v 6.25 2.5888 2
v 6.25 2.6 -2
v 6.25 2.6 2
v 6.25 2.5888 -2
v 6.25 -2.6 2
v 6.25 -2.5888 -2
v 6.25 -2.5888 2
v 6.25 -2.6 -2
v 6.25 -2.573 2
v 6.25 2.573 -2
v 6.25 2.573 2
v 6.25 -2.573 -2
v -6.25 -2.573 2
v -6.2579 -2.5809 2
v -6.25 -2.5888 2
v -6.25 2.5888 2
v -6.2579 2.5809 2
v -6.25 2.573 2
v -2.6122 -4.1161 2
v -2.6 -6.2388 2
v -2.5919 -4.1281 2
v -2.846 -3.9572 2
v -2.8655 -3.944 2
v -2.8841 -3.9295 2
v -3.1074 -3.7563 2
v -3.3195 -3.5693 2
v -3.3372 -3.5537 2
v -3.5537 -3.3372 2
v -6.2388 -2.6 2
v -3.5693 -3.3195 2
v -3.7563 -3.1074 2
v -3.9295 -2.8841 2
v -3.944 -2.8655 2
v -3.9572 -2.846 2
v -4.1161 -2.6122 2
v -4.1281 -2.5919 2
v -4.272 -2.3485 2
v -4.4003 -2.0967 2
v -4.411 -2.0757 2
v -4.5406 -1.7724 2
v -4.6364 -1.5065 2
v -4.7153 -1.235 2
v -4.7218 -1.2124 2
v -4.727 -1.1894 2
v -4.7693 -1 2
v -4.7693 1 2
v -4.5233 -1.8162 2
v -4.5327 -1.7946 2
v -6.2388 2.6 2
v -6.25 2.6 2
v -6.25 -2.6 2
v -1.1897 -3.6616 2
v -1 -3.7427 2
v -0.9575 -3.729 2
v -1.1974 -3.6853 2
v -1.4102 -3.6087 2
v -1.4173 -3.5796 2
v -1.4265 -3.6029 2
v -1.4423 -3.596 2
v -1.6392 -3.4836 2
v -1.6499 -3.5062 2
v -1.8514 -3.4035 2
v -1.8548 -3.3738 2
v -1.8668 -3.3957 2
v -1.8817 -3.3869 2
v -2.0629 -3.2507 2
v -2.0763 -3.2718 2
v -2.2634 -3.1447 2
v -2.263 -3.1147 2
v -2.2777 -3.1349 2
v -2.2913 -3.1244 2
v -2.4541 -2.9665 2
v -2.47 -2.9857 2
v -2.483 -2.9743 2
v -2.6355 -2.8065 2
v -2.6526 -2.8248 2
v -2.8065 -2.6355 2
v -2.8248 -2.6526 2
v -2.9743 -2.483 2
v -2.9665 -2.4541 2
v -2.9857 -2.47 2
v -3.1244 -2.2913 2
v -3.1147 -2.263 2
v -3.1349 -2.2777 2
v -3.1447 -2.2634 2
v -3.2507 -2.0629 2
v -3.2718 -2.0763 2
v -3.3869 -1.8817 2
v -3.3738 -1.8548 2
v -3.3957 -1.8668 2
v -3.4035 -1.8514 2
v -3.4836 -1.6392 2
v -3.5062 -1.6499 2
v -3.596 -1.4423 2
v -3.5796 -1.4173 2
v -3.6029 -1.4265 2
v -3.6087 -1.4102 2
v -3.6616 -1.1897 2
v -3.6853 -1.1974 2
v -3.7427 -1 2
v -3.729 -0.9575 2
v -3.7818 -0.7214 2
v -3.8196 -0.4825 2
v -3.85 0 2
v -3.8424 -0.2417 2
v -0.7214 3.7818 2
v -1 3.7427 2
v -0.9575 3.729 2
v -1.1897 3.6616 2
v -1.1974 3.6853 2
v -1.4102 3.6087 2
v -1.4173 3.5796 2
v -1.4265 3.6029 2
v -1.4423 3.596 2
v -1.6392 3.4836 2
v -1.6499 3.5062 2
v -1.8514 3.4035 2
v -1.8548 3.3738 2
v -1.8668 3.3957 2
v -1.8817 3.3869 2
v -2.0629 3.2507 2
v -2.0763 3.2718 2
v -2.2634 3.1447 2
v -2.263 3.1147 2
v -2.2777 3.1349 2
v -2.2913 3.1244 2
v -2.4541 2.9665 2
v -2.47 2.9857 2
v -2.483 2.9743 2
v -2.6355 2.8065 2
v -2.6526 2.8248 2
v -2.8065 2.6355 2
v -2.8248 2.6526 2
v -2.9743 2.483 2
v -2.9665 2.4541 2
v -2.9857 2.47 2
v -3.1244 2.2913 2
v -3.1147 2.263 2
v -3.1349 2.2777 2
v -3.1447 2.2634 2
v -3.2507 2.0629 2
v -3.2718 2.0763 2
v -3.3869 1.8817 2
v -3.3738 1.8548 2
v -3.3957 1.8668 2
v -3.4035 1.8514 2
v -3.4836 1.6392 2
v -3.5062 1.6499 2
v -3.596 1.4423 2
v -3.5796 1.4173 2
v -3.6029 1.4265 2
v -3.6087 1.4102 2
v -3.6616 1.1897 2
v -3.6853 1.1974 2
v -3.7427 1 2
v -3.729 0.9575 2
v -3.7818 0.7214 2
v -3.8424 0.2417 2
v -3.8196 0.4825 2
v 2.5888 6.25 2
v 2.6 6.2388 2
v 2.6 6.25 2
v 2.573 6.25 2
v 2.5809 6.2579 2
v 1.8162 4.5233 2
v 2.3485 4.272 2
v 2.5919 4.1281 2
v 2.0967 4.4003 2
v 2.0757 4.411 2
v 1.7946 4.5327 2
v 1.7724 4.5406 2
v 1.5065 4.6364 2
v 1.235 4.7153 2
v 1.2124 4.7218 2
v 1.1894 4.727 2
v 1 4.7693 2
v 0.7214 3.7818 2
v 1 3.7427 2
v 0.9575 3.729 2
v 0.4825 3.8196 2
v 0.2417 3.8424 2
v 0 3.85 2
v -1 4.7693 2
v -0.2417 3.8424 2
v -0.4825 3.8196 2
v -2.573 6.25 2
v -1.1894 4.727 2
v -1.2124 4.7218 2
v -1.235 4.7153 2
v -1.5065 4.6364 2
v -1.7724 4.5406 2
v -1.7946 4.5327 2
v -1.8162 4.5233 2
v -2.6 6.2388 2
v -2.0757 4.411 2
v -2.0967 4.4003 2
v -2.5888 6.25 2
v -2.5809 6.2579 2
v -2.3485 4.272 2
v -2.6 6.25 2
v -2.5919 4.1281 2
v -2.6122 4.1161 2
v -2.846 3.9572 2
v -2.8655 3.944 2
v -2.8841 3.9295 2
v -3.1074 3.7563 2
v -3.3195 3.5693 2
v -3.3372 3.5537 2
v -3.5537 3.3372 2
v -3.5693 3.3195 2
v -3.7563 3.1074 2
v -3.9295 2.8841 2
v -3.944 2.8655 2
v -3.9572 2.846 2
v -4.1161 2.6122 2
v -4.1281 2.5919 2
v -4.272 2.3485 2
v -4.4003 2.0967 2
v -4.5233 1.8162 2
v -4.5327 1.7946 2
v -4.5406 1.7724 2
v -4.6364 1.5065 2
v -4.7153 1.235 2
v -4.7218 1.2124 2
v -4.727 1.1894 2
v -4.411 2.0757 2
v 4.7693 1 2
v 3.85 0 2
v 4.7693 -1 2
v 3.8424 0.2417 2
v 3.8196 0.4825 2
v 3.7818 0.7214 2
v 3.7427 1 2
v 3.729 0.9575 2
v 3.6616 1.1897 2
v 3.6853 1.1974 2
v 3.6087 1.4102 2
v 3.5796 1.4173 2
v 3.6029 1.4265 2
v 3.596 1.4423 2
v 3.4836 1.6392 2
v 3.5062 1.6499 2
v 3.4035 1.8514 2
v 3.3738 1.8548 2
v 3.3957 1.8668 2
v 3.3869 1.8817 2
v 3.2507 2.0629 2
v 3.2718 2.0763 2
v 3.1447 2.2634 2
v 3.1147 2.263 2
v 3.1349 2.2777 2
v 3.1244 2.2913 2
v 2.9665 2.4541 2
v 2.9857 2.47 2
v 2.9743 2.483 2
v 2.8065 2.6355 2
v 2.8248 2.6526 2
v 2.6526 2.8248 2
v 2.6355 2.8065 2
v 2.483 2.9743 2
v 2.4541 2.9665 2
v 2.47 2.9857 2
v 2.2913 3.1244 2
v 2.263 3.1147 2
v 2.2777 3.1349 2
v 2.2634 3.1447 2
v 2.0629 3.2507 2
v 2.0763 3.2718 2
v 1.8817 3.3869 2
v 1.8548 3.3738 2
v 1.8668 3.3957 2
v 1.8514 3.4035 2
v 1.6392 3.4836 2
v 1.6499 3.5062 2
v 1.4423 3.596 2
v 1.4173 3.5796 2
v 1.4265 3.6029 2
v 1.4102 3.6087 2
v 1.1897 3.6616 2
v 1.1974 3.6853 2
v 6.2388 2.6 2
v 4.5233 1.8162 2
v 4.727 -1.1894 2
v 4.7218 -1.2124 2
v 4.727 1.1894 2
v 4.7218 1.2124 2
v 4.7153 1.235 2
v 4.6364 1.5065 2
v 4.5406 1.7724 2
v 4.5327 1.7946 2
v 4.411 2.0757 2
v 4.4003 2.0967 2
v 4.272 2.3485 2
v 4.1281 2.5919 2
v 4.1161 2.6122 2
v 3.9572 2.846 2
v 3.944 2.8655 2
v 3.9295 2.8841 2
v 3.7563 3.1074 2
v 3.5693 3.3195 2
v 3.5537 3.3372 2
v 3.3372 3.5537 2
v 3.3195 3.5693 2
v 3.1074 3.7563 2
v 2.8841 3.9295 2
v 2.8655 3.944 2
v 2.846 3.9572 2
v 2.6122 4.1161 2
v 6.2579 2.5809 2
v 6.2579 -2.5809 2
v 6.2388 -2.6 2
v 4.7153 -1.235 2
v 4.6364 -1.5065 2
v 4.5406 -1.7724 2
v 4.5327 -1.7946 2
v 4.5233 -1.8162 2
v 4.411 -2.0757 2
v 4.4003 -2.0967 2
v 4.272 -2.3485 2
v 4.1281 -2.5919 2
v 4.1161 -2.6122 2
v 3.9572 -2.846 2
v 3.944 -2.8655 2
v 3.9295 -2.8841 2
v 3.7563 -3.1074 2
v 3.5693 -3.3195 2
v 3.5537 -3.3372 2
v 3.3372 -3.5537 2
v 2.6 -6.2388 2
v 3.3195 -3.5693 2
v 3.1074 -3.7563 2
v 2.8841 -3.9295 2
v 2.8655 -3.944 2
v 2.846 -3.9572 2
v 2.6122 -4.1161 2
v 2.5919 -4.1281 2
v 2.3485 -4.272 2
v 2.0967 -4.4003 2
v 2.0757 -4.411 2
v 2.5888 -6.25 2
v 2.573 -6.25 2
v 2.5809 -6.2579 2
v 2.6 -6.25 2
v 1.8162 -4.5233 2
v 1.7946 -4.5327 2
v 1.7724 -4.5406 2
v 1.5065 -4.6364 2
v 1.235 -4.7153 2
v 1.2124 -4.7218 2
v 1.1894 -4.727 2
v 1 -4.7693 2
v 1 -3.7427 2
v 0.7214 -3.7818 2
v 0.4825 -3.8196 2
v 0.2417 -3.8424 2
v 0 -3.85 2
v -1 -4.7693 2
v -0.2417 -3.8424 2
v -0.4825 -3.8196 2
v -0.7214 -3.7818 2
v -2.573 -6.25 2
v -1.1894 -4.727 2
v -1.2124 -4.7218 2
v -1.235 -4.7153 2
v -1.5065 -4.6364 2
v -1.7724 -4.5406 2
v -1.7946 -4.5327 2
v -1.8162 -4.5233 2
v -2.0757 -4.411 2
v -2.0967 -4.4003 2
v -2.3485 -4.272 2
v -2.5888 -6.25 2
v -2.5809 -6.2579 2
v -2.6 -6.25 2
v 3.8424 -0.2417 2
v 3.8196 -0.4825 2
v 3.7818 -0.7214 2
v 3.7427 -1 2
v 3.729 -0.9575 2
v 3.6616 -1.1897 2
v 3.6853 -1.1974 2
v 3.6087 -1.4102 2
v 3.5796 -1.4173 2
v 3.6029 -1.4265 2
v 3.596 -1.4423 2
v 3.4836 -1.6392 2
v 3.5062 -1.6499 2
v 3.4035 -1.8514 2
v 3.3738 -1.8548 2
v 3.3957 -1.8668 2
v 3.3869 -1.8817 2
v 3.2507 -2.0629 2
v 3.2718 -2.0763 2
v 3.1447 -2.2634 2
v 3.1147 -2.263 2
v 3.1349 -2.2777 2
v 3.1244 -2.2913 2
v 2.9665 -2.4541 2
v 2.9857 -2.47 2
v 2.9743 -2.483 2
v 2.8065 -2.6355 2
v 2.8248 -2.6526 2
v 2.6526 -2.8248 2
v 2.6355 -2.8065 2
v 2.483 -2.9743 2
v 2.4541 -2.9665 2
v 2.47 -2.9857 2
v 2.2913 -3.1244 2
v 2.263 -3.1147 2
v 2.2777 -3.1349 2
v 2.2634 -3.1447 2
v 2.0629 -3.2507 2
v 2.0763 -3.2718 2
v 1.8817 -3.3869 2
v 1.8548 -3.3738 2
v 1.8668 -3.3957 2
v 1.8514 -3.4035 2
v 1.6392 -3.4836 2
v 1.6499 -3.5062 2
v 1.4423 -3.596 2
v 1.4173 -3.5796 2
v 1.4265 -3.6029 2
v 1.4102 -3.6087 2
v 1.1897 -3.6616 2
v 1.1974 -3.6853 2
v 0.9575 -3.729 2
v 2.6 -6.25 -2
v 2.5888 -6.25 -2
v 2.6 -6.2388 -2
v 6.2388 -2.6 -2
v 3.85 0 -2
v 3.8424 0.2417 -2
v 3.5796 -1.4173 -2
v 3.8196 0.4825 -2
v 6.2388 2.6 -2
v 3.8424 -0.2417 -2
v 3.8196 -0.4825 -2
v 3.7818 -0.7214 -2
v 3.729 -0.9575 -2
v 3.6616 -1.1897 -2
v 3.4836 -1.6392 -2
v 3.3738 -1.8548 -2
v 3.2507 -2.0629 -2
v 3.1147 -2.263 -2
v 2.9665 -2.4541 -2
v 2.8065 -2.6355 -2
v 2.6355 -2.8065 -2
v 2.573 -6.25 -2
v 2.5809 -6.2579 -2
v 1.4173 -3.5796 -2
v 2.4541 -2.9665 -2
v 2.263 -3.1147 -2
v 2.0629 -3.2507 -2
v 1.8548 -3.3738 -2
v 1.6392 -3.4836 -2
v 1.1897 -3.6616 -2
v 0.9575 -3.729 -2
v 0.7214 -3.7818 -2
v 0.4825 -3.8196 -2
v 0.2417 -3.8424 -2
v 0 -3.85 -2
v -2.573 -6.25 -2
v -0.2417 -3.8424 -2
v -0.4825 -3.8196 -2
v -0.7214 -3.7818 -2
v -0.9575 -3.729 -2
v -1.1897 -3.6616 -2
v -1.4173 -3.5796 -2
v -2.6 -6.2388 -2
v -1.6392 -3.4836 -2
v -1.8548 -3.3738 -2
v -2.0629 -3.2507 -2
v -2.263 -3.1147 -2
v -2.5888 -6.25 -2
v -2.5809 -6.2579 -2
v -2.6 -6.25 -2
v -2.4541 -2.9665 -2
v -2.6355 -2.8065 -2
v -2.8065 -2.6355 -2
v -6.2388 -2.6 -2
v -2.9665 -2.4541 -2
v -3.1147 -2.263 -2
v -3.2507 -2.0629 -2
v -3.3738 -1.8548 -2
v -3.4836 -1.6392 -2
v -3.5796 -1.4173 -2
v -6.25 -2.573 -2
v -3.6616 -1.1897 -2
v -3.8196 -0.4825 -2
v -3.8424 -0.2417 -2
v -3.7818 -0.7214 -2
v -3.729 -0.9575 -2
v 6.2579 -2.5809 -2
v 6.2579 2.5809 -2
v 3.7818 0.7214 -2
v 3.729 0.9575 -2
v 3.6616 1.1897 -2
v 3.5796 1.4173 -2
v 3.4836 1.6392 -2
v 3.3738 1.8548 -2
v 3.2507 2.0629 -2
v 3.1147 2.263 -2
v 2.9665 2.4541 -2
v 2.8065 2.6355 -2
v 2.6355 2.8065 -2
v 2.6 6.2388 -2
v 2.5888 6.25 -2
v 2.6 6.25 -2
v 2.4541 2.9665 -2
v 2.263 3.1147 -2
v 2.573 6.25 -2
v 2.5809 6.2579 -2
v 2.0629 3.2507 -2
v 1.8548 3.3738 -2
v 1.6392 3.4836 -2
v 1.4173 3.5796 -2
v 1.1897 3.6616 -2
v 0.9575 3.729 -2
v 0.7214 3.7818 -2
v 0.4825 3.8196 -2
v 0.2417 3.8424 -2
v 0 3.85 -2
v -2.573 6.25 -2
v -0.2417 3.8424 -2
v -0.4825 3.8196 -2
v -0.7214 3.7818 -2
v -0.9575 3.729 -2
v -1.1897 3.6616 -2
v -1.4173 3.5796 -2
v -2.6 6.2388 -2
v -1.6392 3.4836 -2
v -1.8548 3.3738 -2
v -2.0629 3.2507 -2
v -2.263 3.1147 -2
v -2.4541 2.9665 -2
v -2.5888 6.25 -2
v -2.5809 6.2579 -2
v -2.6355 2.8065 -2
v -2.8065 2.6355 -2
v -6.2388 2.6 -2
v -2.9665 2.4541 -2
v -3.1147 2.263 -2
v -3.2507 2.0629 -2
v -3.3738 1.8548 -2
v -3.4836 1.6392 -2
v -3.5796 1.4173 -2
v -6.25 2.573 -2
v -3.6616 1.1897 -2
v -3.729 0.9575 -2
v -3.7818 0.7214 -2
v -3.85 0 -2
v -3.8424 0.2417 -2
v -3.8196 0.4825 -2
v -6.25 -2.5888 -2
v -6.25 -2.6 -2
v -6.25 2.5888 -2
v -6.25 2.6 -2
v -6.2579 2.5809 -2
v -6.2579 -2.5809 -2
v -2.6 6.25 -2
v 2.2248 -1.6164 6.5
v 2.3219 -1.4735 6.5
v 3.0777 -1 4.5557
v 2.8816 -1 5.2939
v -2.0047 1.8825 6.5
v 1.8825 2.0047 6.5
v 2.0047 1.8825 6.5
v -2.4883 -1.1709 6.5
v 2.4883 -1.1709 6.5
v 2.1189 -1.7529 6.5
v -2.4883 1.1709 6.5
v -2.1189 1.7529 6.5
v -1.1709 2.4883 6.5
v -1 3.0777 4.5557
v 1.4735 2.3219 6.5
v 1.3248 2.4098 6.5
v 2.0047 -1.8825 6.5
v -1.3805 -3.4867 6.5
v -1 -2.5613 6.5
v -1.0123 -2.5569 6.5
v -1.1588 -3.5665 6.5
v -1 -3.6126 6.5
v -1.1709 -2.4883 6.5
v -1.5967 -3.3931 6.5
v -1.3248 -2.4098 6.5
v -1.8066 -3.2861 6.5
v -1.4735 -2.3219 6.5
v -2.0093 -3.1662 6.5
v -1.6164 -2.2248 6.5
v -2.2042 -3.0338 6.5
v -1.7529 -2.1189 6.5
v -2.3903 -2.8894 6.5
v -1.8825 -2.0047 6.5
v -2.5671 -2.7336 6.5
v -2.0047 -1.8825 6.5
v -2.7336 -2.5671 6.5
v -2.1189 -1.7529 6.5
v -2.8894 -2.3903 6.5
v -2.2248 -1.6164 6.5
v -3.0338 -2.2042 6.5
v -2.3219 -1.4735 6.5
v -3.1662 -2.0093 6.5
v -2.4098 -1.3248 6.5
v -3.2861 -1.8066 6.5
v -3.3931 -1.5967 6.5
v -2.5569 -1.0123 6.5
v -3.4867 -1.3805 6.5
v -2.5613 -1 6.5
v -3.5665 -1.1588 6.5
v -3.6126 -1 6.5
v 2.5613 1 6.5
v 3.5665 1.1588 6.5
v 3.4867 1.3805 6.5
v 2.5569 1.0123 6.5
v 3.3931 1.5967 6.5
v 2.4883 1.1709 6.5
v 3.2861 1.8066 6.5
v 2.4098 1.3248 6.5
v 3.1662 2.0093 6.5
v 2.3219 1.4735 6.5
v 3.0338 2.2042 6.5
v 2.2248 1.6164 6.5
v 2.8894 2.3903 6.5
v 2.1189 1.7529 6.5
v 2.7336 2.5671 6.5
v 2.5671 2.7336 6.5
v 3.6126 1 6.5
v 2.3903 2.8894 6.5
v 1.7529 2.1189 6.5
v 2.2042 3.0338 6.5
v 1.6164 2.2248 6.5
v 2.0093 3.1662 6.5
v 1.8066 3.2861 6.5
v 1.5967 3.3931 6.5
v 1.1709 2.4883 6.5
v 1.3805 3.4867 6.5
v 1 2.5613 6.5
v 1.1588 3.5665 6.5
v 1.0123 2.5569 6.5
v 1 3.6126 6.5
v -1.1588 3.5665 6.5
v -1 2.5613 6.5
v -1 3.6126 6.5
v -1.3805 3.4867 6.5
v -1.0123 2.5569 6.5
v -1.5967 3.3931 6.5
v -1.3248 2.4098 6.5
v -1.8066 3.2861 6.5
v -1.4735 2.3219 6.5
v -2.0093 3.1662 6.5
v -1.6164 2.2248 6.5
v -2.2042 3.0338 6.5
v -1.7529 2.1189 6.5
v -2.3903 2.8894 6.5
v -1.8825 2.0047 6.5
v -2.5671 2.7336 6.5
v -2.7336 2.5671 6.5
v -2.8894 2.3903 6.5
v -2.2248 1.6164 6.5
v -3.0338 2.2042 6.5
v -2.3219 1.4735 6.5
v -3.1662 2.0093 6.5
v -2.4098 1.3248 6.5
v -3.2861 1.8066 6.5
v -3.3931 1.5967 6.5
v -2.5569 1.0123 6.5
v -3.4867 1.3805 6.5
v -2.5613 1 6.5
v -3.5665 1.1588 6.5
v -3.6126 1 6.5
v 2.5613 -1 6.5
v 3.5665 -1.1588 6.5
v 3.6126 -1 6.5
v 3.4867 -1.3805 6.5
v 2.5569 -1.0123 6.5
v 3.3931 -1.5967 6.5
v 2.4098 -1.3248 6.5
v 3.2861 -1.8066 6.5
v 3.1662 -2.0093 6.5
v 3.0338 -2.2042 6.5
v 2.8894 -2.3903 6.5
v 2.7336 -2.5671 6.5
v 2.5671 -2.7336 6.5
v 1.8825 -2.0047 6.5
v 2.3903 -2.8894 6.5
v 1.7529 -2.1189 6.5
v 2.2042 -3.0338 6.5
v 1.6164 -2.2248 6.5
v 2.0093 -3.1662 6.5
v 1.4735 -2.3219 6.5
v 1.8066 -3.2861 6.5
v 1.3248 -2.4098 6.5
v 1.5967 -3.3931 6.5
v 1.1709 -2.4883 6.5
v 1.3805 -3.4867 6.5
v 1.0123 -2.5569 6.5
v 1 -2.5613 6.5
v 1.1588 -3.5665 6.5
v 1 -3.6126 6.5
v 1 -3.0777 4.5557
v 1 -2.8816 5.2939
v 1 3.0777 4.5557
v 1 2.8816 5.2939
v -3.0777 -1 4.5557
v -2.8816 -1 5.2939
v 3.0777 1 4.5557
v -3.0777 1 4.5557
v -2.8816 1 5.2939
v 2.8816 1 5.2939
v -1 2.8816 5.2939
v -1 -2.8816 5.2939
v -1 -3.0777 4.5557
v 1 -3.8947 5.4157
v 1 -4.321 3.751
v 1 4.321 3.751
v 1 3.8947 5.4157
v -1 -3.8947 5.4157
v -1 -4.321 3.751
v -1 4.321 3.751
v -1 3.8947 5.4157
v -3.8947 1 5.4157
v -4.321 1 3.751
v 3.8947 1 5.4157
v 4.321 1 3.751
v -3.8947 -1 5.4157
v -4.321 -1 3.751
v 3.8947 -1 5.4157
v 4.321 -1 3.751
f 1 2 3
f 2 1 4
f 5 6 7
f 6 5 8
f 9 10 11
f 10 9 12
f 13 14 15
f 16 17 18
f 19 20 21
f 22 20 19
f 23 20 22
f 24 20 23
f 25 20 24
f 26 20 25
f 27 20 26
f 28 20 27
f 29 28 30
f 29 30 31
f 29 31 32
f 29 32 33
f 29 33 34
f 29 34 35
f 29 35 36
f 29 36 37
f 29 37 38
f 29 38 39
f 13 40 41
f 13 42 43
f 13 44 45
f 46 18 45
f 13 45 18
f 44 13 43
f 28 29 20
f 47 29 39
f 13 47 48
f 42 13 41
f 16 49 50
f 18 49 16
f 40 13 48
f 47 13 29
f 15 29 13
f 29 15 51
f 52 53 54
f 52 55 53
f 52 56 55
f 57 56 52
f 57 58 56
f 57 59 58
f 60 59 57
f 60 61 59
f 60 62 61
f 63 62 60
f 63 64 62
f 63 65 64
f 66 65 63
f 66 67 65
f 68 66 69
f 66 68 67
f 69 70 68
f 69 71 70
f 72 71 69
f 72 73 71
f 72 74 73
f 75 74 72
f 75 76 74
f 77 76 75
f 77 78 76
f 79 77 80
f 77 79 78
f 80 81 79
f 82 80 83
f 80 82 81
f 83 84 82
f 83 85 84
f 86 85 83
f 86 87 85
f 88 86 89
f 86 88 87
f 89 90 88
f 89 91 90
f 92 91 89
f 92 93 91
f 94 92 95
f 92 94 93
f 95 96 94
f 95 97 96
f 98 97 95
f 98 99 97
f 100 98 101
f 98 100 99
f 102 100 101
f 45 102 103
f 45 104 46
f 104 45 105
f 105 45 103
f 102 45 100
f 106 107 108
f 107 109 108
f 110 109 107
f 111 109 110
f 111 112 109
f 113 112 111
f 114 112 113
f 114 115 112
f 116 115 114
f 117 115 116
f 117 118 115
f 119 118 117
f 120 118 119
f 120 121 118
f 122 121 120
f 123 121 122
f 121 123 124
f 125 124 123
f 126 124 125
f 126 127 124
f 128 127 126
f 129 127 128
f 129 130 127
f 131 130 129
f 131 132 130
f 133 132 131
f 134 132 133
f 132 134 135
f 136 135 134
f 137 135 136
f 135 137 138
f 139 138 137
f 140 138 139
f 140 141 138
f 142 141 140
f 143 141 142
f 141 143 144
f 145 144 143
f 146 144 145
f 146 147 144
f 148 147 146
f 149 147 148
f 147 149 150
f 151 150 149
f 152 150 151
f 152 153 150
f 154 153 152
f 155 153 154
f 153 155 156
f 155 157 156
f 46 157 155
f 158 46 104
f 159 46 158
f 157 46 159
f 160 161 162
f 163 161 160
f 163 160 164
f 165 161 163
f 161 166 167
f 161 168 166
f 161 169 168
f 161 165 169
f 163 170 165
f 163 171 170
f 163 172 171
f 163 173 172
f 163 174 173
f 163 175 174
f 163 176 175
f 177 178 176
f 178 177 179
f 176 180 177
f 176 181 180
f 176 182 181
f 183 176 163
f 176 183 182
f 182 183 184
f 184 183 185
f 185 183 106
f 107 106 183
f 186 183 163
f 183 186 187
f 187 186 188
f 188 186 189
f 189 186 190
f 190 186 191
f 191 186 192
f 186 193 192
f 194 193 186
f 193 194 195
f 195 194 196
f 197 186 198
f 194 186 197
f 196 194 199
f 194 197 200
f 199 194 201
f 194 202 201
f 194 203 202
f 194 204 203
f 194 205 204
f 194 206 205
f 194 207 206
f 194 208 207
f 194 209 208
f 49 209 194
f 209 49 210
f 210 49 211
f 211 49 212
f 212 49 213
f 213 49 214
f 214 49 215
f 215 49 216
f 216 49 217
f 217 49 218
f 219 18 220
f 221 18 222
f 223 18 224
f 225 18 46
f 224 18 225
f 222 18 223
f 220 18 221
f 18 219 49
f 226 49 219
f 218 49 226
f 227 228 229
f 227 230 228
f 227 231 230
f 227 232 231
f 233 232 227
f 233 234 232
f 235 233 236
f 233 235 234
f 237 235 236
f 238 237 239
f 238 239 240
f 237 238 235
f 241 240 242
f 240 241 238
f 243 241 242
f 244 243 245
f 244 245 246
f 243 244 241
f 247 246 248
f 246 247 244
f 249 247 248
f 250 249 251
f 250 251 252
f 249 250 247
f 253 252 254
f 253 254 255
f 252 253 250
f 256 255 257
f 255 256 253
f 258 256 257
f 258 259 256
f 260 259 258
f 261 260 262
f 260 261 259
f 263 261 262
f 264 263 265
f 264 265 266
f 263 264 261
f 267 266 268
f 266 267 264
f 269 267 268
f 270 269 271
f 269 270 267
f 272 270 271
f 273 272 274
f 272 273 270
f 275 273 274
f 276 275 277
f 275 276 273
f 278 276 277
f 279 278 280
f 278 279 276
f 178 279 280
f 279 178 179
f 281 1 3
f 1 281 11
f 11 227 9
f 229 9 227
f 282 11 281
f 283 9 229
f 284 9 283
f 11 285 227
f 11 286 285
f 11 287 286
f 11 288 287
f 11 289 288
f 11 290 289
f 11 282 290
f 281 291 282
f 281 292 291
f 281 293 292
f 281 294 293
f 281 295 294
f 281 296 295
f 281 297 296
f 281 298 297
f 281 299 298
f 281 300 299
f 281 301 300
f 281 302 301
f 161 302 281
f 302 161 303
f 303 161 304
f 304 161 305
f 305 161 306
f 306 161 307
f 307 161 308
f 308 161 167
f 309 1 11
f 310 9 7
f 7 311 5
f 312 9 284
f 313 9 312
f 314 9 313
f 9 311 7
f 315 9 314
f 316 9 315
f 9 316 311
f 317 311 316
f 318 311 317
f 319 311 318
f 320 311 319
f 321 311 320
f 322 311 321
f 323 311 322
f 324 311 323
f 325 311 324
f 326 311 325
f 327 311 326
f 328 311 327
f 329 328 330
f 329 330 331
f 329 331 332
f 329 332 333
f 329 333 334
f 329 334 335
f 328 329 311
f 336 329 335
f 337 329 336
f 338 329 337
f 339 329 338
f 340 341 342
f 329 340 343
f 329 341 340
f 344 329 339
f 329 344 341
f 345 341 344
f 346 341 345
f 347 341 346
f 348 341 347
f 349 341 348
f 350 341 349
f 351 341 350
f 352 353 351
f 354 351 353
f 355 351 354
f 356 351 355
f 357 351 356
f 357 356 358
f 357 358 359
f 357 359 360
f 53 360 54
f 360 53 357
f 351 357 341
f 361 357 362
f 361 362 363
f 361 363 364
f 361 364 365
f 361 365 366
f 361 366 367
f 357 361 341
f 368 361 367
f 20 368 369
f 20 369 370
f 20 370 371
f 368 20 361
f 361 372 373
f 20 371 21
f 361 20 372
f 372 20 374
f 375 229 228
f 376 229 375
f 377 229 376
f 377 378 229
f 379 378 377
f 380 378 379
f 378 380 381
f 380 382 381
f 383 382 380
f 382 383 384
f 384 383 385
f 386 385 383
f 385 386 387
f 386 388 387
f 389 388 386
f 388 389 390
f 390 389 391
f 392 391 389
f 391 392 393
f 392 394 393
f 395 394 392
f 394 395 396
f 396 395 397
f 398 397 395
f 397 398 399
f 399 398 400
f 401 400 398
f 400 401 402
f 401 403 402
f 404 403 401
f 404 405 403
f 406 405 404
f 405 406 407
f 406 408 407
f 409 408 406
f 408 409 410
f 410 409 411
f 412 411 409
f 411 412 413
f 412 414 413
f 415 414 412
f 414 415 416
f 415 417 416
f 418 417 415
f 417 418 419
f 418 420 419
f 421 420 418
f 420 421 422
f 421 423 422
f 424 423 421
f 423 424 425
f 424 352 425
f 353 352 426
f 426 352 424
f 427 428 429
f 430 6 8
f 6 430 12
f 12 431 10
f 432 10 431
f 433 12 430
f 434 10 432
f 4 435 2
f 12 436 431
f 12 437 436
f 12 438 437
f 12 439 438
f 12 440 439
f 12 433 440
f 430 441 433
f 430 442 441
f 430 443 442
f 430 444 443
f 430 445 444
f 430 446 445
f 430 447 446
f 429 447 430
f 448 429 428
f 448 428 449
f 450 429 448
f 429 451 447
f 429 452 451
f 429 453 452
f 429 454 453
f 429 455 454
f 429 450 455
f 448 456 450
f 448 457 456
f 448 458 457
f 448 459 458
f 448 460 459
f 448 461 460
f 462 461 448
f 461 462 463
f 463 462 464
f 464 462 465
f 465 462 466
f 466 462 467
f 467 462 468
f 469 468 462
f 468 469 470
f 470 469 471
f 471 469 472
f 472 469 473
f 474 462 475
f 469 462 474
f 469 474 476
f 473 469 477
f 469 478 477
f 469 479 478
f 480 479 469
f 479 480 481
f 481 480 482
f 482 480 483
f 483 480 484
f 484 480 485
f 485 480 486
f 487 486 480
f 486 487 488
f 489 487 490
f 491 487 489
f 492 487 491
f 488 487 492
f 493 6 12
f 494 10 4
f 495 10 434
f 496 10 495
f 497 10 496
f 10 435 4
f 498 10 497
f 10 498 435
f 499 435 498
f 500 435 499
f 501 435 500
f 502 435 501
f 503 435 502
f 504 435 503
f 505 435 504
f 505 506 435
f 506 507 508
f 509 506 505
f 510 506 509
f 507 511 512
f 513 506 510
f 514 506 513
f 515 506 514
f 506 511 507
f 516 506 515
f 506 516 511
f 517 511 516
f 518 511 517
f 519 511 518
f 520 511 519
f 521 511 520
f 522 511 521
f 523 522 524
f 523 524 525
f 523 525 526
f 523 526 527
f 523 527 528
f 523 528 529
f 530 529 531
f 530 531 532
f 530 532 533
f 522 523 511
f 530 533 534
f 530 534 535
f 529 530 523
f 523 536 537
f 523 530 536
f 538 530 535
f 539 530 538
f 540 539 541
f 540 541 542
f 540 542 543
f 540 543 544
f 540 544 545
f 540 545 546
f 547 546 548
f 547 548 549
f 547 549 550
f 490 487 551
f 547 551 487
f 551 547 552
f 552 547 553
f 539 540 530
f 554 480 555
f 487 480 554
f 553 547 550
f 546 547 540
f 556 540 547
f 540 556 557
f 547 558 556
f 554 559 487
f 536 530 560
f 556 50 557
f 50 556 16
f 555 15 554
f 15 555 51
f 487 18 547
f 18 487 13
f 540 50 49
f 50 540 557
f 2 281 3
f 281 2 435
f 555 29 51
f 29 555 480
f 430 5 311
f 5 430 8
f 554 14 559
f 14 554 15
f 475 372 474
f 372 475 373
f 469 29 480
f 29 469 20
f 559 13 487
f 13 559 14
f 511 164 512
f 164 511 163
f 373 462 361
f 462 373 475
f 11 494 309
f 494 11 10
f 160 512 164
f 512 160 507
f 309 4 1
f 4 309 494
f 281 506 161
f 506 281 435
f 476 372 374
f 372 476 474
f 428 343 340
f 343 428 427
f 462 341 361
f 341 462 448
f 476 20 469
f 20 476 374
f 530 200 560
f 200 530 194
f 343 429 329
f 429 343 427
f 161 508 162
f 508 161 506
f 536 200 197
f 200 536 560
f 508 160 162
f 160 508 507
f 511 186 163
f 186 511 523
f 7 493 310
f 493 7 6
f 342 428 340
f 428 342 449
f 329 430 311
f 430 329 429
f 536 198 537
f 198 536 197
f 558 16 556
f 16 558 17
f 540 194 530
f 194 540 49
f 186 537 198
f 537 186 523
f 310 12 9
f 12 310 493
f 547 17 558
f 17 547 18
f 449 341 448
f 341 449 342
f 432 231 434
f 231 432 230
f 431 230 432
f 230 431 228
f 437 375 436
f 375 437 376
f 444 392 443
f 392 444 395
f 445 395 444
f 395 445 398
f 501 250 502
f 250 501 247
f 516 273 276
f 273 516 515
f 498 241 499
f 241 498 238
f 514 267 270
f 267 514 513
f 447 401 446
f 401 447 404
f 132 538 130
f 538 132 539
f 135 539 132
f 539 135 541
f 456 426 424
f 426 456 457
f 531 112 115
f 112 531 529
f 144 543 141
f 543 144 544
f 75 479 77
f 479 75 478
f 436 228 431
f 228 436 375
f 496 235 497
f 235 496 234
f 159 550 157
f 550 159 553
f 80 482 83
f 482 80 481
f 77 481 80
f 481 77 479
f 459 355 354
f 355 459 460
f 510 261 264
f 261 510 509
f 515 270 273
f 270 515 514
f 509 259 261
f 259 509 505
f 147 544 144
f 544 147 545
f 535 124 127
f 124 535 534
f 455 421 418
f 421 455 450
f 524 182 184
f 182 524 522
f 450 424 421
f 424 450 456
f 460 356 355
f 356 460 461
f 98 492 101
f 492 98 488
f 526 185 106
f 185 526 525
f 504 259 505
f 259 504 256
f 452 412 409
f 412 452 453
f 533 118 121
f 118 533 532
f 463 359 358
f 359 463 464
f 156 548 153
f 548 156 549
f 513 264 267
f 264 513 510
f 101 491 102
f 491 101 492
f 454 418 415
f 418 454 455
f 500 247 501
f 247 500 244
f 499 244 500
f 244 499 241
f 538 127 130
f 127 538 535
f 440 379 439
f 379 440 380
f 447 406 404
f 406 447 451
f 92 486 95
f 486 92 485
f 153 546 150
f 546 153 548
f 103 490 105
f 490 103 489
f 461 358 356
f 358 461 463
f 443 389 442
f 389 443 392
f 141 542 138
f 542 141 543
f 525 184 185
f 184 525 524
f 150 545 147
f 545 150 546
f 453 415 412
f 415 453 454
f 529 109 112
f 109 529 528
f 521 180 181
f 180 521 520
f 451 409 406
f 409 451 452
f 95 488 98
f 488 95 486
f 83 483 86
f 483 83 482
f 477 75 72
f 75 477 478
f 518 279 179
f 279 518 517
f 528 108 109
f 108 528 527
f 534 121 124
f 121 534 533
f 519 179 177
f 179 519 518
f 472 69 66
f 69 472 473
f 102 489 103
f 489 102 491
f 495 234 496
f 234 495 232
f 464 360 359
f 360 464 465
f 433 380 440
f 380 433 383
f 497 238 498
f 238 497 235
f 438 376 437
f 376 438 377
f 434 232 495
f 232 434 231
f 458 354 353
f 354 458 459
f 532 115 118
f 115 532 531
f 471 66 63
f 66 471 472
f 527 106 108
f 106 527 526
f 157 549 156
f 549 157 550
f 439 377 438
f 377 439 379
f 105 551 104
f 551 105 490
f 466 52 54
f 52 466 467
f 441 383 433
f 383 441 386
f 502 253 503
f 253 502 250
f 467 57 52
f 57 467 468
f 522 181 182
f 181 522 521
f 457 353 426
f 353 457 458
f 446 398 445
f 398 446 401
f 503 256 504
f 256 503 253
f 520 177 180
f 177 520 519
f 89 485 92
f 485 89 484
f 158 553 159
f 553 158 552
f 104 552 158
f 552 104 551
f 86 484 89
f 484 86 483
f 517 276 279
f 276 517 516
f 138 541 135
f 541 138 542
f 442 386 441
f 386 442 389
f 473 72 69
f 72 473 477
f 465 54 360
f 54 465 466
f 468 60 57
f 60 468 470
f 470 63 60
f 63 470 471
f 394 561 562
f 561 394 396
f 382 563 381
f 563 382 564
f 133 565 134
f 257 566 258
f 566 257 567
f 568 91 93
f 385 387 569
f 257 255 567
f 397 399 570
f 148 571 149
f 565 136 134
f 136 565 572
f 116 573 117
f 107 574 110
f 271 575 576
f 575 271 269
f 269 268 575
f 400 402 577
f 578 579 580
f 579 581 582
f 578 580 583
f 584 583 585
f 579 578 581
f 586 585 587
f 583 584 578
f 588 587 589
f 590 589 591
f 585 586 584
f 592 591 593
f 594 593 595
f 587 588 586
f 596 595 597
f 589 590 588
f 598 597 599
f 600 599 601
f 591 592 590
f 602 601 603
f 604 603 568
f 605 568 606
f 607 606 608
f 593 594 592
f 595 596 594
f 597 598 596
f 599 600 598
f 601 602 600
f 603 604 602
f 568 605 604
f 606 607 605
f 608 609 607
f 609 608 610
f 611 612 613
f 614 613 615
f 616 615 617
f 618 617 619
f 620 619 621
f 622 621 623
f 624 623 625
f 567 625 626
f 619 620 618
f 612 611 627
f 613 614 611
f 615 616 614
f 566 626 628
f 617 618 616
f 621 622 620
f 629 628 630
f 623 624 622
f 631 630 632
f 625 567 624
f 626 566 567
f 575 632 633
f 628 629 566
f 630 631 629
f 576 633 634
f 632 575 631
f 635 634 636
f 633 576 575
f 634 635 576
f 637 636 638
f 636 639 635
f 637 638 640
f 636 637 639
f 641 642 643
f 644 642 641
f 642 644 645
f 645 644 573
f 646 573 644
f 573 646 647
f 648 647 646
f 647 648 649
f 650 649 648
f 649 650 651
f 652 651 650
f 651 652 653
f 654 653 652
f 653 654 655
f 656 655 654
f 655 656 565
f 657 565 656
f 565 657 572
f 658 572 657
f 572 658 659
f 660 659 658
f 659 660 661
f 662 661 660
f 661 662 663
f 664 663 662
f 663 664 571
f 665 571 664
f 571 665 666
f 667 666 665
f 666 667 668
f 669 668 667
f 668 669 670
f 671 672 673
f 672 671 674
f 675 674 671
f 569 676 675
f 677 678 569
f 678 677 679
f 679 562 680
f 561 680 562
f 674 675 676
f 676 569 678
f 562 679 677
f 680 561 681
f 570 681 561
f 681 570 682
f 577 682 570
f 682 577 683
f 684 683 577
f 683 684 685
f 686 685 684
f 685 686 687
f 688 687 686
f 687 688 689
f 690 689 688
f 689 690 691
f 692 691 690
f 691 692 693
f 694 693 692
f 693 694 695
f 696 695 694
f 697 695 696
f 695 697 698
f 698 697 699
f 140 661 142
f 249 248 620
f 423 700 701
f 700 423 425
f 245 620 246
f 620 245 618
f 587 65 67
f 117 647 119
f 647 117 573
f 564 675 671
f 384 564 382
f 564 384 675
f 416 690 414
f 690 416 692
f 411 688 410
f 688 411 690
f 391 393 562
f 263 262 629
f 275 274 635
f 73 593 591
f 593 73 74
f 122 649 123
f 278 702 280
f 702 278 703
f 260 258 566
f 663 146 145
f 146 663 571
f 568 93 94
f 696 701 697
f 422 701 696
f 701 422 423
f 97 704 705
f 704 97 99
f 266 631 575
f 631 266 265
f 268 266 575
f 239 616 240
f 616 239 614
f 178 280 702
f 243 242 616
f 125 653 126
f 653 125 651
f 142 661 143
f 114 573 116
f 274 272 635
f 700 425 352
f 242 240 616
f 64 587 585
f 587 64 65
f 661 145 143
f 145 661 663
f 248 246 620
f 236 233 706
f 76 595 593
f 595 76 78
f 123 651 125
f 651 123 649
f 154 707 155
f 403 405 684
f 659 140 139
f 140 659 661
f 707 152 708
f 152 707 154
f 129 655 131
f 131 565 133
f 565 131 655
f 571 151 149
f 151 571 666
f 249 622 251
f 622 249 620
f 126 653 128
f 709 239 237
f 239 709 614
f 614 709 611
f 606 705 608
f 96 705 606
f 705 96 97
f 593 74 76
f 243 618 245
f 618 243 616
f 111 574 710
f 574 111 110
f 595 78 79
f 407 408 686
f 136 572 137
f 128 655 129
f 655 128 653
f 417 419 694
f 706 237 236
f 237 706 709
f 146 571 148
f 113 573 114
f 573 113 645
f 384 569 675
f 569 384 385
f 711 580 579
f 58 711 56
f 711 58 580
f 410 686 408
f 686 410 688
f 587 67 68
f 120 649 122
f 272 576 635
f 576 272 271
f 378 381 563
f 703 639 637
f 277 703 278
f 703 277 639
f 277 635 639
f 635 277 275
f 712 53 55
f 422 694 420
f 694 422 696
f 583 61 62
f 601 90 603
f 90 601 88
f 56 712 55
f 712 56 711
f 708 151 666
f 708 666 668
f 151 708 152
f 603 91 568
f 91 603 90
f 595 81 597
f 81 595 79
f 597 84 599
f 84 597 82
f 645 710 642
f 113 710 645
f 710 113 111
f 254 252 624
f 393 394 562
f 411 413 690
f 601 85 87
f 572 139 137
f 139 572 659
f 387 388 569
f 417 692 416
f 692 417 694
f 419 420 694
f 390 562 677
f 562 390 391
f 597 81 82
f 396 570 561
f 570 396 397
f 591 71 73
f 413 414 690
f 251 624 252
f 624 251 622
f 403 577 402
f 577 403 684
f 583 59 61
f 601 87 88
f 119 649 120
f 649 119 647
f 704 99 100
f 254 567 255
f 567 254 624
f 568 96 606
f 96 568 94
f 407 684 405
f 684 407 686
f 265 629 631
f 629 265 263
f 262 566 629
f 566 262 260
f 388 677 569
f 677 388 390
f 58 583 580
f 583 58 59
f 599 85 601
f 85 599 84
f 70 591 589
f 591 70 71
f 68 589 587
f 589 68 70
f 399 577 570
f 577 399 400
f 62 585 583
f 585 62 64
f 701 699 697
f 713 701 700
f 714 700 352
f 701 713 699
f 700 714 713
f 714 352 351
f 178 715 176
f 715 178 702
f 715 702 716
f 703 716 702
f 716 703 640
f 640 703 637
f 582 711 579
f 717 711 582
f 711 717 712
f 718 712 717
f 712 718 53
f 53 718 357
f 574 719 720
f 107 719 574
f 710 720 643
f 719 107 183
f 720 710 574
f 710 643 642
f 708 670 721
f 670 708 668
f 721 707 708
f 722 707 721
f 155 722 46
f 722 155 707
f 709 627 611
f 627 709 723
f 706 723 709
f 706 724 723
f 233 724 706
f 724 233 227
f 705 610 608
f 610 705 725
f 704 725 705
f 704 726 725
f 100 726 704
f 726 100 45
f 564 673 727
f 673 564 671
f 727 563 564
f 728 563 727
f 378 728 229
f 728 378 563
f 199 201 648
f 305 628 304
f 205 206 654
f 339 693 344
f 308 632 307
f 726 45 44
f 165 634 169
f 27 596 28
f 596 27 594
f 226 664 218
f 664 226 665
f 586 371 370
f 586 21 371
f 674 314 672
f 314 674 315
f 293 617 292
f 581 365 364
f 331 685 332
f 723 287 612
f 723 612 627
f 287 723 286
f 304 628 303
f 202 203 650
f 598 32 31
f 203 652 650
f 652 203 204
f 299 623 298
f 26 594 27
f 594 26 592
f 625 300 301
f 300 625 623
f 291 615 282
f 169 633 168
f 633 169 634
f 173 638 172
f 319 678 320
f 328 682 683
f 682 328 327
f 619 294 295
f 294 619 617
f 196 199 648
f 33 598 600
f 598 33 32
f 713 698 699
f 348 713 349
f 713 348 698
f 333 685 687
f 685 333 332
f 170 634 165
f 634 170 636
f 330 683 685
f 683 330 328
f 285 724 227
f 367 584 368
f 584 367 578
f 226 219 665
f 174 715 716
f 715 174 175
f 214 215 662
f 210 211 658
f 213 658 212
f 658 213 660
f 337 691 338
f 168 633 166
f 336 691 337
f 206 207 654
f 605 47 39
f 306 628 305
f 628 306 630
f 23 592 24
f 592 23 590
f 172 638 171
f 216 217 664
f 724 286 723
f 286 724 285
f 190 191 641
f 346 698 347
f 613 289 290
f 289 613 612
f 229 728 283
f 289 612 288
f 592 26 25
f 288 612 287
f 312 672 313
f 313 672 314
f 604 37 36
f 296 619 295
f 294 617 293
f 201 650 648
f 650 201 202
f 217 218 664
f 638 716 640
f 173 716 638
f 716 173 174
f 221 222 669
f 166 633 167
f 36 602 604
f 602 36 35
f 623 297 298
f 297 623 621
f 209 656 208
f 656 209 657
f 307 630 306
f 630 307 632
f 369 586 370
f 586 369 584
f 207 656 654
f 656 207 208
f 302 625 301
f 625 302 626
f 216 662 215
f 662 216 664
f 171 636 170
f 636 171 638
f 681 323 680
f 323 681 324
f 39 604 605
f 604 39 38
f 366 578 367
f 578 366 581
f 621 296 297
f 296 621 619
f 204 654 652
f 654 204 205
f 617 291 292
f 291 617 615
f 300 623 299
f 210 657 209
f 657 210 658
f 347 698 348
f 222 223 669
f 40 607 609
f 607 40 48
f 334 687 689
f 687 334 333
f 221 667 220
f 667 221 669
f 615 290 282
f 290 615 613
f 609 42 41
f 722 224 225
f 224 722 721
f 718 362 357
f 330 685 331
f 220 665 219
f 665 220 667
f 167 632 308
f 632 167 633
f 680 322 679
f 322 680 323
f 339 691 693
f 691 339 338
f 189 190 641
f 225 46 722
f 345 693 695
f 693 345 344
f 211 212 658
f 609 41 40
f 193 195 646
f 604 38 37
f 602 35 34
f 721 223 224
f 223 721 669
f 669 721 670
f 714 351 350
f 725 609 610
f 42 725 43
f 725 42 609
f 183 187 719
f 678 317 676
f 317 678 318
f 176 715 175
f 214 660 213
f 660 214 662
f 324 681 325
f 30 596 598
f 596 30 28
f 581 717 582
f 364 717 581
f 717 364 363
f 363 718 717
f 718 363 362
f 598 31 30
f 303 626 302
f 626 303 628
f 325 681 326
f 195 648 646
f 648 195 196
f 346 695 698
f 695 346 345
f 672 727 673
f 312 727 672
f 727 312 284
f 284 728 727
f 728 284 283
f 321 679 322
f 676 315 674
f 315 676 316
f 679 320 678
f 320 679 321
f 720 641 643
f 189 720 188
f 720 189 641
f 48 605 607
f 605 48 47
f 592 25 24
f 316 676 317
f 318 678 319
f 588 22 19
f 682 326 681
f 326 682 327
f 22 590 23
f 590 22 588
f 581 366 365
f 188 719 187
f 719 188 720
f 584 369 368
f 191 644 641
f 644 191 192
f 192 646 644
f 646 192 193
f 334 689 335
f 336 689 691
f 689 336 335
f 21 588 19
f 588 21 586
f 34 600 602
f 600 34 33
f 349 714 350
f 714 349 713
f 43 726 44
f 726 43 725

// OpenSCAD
$fn=100;

difference() {
    union() {
        cube([12.5,5.2,4], center=true);
        rotate([0,0,45]) cube([12.5,5.2,4], center=true);
        rotate([0,0,90]) cube([12.5,5.2,4], center=true);
        rotate([0,0,-45]) cube([12.5,5.2,4], center=true);
    }
    cylinder(d=7.7,h=10,center=true);  
}

translate([0,0,4]) difference() {
    cylinder(d1=10,d2=7.5,h=5, center=true);
    union(){
        cylinder(d1=8,d2=5.5,h=5, center=true);  
        cube([2,10,10], center=true);
        cube([10,2,10], center=true);
    }
}
